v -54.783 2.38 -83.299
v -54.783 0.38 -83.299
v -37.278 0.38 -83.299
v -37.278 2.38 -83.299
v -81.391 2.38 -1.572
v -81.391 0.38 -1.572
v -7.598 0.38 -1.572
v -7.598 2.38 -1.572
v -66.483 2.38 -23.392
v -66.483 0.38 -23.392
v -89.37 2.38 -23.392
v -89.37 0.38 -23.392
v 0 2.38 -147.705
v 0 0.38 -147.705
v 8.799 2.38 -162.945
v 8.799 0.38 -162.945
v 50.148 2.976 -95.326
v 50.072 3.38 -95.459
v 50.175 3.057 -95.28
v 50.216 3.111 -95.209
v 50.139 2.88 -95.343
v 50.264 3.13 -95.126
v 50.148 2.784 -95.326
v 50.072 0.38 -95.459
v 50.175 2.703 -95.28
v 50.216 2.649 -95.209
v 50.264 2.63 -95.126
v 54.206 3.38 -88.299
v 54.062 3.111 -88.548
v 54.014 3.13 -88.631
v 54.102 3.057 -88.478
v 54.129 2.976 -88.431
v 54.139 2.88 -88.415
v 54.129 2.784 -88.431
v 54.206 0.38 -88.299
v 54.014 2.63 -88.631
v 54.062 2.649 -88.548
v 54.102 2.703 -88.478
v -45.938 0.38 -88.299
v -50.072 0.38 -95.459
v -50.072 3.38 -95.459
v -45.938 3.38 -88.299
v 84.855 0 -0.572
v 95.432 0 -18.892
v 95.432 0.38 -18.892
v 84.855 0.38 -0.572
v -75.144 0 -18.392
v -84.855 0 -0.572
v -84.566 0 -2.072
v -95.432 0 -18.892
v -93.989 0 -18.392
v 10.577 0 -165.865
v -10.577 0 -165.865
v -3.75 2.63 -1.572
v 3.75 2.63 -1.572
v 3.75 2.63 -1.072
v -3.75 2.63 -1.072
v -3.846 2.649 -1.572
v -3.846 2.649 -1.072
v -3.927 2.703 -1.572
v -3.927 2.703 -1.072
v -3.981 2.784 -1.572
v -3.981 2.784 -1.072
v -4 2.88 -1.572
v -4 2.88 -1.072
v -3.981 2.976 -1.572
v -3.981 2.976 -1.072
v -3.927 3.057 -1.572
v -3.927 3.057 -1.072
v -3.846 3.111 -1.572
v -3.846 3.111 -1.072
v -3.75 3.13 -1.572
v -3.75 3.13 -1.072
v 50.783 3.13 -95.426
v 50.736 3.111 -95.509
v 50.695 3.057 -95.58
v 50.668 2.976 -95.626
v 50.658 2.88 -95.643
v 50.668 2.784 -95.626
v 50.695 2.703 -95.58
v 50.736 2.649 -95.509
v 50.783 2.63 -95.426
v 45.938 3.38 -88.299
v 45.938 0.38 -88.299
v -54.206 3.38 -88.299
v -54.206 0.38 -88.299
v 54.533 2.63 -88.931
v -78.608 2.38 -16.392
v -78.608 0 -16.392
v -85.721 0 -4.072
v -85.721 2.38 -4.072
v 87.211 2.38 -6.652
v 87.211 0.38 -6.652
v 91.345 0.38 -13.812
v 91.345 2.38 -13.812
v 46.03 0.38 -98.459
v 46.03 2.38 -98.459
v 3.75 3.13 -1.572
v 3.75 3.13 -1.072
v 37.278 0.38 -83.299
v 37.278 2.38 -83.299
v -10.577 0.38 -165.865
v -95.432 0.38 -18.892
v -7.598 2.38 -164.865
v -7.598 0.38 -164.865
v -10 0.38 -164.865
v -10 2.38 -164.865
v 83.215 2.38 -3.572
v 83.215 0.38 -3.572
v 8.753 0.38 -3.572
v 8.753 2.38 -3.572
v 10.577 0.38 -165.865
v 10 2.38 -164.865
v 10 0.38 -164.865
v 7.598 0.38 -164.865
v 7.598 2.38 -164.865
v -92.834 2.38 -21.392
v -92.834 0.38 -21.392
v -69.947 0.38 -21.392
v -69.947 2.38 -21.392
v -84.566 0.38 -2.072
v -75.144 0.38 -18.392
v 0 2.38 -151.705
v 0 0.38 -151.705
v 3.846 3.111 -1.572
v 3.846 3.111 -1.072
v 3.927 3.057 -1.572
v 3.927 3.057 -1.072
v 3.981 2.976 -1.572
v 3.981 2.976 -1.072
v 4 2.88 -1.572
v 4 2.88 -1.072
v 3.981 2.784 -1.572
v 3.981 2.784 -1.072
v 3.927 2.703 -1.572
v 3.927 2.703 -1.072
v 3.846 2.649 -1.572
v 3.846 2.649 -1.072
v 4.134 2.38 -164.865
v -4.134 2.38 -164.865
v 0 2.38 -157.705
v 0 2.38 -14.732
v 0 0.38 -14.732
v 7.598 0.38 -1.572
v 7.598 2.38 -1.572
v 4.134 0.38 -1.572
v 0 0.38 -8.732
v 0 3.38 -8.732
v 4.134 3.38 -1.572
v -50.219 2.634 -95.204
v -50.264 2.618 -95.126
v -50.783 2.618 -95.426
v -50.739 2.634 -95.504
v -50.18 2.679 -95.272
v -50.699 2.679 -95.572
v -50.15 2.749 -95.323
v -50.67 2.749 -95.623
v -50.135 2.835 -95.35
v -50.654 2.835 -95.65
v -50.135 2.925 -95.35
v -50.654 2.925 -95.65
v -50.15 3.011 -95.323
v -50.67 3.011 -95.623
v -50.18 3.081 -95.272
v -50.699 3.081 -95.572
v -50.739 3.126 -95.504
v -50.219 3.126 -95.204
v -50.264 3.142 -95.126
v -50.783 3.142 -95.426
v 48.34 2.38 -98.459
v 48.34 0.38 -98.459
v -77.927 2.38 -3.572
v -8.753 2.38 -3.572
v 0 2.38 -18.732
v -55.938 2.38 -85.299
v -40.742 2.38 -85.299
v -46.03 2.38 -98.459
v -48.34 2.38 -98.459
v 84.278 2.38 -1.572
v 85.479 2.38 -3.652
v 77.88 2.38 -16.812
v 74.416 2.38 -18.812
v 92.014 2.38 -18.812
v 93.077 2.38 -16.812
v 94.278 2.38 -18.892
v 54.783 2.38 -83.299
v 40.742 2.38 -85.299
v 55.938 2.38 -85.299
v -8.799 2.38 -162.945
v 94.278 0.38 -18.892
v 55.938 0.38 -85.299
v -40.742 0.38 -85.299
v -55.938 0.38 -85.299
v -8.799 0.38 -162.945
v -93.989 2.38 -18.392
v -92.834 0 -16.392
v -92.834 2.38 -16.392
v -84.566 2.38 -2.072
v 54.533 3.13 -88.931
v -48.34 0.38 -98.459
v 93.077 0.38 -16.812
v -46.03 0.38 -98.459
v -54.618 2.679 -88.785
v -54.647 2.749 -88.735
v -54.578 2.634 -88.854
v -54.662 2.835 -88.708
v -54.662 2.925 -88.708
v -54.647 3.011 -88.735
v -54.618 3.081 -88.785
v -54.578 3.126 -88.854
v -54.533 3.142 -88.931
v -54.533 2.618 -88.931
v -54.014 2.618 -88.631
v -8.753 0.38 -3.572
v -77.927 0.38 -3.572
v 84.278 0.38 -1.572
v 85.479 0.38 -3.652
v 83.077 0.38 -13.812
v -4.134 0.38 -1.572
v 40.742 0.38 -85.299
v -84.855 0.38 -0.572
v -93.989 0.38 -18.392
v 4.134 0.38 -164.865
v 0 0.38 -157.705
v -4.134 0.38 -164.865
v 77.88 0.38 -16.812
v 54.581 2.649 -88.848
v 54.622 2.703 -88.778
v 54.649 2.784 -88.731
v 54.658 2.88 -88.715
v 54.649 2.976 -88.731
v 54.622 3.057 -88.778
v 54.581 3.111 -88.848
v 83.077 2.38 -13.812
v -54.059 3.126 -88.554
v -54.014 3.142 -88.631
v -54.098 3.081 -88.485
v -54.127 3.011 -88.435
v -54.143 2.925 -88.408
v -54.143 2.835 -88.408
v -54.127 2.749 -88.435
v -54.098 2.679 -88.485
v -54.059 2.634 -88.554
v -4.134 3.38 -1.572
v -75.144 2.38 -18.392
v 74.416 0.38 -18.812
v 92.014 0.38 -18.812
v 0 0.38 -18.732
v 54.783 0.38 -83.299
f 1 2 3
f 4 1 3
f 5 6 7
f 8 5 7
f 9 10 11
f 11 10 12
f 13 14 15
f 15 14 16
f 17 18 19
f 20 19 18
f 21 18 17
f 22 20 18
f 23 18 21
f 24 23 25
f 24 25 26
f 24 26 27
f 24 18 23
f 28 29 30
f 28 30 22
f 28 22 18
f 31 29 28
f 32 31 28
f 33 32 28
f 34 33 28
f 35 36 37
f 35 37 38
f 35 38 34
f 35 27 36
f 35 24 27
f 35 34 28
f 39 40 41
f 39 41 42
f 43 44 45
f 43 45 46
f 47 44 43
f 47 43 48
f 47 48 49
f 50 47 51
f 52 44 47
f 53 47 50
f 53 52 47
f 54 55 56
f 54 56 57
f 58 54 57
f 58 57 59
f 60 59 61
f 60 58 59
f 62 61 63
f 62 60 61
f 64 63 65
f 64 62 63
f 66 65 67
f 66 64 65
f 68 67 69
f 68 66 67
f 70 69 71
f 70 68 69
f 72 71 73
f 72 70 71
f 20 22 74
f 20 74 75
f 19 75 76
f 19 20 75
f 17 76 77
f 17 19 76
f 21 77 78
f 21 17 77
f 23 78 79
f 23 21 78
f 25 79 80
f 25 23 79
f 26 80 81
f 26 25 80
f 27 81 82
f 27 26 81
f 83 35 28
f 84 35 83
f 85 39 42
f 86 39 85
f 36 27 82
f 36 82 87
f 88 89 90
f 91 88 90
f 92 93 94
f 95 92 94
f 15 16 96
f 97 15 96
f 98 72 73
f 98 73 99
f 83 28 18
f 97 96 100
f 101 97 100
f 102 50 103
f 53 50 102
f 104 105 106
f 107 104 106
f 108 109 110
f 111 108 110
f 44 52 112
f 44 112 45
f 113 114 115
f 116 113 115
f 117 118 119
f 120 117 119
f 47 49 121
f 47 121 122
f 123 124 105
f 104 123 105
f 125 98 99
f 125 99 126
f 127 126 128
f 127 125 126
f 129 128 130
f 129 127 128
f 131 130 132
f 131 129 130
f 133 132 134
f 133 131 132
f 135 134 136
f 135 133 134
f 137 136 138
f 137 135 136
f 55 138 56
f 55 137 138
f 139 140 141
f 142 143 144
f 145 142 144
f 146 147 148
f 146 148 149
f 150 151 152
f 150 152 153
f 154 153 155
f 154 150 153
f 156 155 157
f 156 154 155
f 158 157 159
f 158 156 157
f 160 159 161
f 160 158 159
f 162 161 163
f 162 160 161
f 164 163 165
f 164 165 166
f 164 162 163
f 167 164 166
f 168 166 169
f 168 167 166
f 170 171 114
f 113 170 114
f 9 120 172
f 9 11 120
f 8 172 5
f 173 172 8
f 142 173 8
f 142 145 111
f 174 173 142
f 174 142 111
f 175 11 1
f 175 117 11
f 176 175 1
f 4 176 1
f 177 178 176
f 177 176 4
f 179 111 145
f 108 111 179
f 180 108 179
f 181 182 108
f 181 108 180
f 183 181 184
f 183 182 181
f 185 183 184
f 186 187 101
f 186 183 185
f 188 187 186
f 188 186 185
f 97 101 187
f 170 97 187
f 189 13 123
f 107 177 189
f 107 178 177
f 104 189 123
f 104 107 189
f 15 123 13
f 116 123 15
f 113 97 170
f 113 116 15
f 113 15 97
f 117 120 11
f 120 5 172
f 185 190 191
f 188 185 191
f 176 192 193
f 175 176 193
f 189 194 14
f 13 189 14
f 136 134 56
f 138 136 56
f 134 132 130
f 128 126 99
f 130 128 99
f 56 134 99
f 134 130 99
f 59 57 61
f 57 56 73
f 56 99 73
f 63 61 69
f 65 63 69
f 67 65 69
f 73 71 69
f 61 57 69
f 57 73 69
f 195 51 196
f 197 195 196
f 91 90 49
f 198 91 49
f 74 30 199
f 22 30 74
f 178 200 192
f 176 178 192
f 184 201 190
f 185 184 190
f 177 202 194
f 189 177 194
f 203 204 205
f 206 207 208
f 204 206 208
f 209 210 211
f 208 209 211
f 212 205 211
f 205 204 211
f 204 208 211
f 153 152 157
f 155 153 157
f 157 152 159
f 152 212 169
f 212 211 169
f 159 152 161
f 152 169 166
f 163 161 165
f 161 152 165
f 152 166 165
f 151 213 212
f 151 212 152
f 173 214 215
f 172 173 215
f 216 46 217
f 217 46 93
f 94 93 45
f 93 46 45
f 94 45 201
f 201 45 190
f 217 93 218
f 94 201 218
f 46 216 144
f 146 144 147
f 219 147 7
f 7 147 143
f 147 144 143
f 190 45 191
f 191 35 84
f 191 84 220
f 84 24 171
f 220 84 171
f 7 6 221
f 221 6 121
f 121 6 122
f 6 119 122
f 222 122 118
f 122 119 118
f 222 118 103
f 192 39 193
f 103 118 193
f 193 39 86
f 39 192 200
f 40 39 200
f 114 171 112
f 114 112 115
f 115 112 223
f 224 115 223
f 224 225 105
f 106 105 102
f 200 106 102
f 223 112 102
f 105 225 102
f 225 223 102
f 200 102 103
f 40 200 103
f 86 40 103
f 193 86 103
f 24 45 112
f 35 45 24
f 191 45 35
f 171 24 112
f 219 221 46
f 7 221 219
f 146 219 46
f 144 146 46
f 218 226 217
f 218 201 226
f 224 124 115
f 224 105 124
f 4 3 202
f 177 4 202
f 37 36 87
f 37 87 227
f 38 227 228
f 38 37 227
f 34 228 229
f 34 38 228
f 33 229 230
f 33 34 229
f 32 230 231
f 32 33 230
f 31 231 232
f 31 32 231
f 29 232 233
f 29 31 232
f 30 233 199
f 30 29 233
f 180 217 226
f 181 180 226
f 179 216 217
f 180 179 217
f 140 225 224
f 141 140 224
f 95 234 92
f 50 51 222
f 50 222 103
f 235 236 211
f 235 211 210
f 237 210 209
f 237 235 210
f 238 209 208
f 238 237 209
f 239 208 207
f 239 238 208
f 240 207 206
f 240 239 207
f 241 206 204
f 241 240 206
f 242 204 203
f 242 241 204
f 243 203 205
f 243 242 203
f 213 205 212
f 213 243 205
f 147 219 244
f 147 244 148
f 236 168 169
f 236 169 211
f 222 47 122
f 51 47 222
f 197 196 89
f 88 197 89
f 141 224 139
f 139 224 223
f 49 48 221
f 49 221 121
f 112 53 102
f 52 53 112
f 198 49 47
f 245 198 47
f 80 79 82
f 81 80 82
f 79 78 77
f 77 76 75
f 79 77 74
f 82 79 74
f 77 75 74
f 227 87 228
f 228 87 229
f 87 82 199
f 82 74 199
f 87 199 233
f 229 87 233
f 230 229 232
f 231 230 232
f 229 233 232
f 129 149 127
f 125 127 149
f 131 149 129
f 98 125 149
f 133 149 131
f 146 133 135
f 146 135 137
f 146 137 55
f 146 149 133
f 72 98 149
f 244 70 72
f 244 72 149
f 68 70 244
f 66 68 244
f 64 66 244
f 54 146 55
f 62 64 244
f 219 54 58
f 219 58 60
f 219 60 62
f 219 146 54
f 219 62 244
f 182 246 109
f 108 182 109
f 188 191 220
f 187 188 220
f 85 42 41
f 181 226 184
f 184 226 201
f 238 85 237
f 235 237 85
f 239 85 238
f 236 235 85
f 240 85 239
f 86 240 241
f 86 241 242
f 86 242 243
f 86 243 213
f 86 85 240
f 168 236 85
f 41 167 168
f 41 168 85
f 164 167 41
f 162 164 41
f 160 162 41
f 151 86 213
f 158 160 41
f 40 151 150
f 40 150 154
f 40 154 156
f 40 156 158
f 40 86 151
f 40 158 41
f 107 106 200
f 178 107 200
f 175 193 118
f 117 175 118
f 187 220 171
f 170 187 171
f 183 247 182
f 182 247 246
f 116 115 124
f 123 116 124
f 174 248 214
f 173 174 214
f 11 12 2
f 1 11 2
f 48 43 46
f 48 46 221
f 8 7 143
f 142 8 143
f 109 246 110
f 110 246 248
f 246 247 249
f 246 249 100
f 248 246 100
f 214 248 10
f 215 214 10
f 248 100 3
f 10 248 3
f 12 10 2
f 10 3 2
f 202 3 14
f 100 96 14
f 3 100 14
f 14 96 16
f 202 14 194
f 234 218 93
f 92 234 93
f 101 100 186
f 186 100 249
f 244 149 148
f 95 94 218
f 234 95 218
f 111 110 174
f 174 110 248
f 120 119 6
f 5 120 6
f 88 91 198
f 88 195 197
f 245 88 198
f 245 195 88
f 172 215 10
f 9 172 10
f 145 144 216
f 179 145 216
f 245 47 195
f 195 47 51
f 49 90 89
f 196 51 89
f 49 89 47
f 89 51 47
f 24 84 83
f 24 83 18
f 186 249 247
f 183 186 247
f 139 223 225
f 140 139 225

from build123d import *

# Parameters (mm, degrees)
BOSS_EXTRUDE1_DEPTH   = 2.38
BOSS_EXTRUDE1_2_DEPTH = 2.38
BOSS_EXTRUDE1_3_DEPTH = 2.38
BOSS_EXTRUDE1_4_DEPTH = 2.38
BOSS_EXTRUDE4_DEPTH   = 0.38
BOSS_EXTRUDE5_DEPTH   = 3.38
BOSS_EXTRUDE6_DEPTH   = 0.5
BOSS_EXTRUDE7_DEPTH   = 0.6
BOSS_EXTRUDE8_DEPTH   = 0.6


with BuildPart() as part:
    # Sketch1 → Boss-Extrude1 (new body)
    with BuildSketch(Plane(origin=(0, 0, 0), x_dir=(1, 0, 0), z_dir=(0, 1, 0))):
        Polygon((-85.720943795, 4.071796796), (-84.566243256, 2.071796795), (-75.143593538, 18.392304849), (-93.988892974, 18.392304849), (-92.834192436, 16.392304849), (-78.607695153, 16.392304849), align=None)
    extrude(amount=BOSS_EXTRUDE1_DEPTH)


with BuildPart() as body_2:
    # Sketch1 → Boss-Extrude1 2 (new body)
    with BuildSketch(Plane(origin=(0, 0, 0), x_dir=(1, 0, 0), z_dir=(0, 1, 0))):
        Polygon((91.344555444, 13.812177834), (83.076606252, 13.812177834), (87.210580853, 6.651923788), align=None)
    extrude(amount=BOSS_EXTRUDE1_2_DEPTH)


with BuildPart() as body_3:
    # Sketch1 → Boss-Extrude1 3 (new body)
    with BuildSketch(Plane(origin=(0, 0, 0), x_dir=(1, 0, 0), z_dir=(0, 1, 0))):
        Polygon((4.133974596, 164.865334799), (-4.133974596, 164.865334799), (0, 157.705080761), align=None)
    extrude(amount=BOSS_EXTRUDE1_3_DEPTH)


with BuildPart() as body_4:
    # Sketch1 → Boss-Extrude1 4 (new body)
    with BuildSketch(Plane(origin=(0, 0, 0), x_dir=(1, 0, 0), z_dir=(0, 1, 0))):
        Polygon((-92.834192436, 21.392304849), (-69.947441134, 21.392304849), (-81.390816785, 1.571796811), (-7.598076227, 1.571796811), (5.6e-08, 14.732050972), (7.598076338, 1.571796812), (84.27756817, 1.571796812), (85.478530104, 3.651923899), (77.880453952, 16.812177834), (93.076606256, 16.812177834), (94.277568143, 18.892304841), (55.937822181, 85.298692796), (40.741669759, 85.298692796), (48.33974597, 98.458946834), (10.000000007, 164.865334792), (7.598076211, 164.865334792), (0, 151.705080754), (-7.598076212, 164.865334792), (-9.999999977, 164.865334792), (-48.339745938, 98.458946839), (-40.741669726, 85.298692801), (-55.937822149, 85.298692801), align=None)
        Polygon((-8.752776823, 3.571796679), (-77.926715228, 3.571796679), (-66.4833395, 23.392304849), (-89.370090821, 23.392304849), (-54.783121611, 83.298692801), (-37.277568111, 83.298692801), (-46.030344861, 98.458946839), (-8.799038094, 162.945461791), (0, 147.705080754), (8.799038109, 162.945461817), (46.030344894, 98.458946834), (37.277568144, 83.298692796), (54.783121643, 83.298692796), (92.014428415, 18.812177834), (74.416352337, 18.812177834), (83.2153905, 3.571796679), (8.752776819, 3.571796679), (-2e-09, 18.73205084), align=None, mode=Mode.SUBTRACT)
    extrude(amount=BOSS_EXTRUDE1_4_DEPTH)


    add(body_2.part)  # Boss-Extrude4 merges body 2

    add(body_3.part)  # Boss-Extrude4 merges body 3
    # Sketch1<8> → Boss-Extrude4 (add)
    # profile 1 of 2: a face of its own
    with BuildSketch(Plane(origin=(0, 0, 0), x_dir=(1, 0, 0), z_dir=(0, 1, 0))):
        Polygon((-75.143593538, 18.392304849), (-84.566243256, 2.071796795), (-84.854918391, 0.571796796), (84.85491843, 0.571796796), (95.432268703, 18.892304753), (10.577350242, 165.865334799), (-10.577350242, 165.865334799), (-95.432268647, 18.892304849), (-93.988892974, 18.392304849), align=None)
        Polygon((4.133974507, 1.571796687), (-4.133974466, 1.571796687), (-1.08e-07, 8.732050756), align=None, mode=Mode.SUBTRACT)
        Polygon((87.210580853, 6.651923788), (83.076606252, 13.812177834), (91.344555444, 13.812177834), align=None, mode=Mode.SUBTRACT)
        Polygon((-45.937822149, 88.298692801), (-54.205771341, 88.298692801), (-50.071796745, 95.458946839), align=None, mode=Mode.SUBTRACT)
        Polygon((0, 157.705080761), (-4.133974596, 164.865334799), (4.133974596, 164.865334799), align=None, mode=Mode.SUBTRACT)
        Polygon((-81.390816785, 1.571796811), (-69.947441134, 21.392304849), (-92.834192436, 21.392304849), (-55.937822149, 85.298692801), (-40.741669726, 85.298692801), (-48.339745938, 98.458946839), (-9.999999977, 164.865334792), (-7.598076212, 164.865334792), (0, 151.705080754), (7.598076211, 164.865334792), (10.000000007, 164.865334792), (48.33974597, 98.458946834), (40.741669759, 85.298692796), (55.937822181, 85.298692796), (94.277568143, 18.892304841), (93.076606256, 16.812177834), (77.880453952, 16.812177834), (85.478530104, 3.651923899), (84.27756817, 1.571796812), (7.598076338, 1.571796812), (5.6e-08, 14.732050972), (-7.598076227, 1.571796811), align=None, mode=Mode.SUBTRACT)
        Polygon((54.205771446, 88.298692803), (45.937822254, 88.298692803), (50.07179685, 95.458946841), align=None, mode=Mode.SUBTRACT)
    # profile 2 of 2: a face of its own
    with BuildSketch(Plane(origin=(0, 0, 0), x_dir=(1, 0, 0), z_dir=(0, 1, 0))):
        Polygon((-66.4833395, 23.392304849), (-77.926715228, 3.571796679), (-8.752776823, 3.571796679), (-2e-09, 18.73205084), (8.752776819, 3.571796679), (83.2153905, 3.571796679), (74.416352337, 18.812177834), (92.014428415, 18.812177834), (54.783121643, 83.298692796), (37.277568144, 83.298692796), (46.030344894, 98.458946834), (8.799038109, 162.945461817), (0, 147.705080754), (-8.799038094, 162.945461791), (-46.030344861, 98.458946839), (-37.277568111, 83.298692801), (-54.783121611, 83.298692801), (-89.370090821, 23.392304849), align=None)
    extrude(amount=BOSS_EXTRUDE4_DEPTH)

    # Sketch1<9> → Boss-Extrude5 (add)
    with BuildSketch(Plane(origin=(0, 0, 0), x_dir=(1, 0, 0), z_dir=(0, 1, 0))):
        Polygon((-1.08e-07, 8.732050756), (-4.133974466, 1.571796687), (4.133974507, 1.571796687), align=None)
        Polygon((50.07179685, 95.458946841), (45.937822254, 88.298692803), (54.205771446, 88.298692803), align=None)
        Polygon((-50.071796745, 95.458946839), (-54.205771341, 88.298692801), (-45.937822149, 88.298692801), align=None)
    extrude(amount=BOSS_EXTRUDE5_DEPTH)

    # Sketch2 → Boss-Extrude6 (add)
    with BuildSketch(Plane.XY.offset(-1.571796687)):
        with BuildLine():
            Line((3.750000065, 2.63), (-3.749999935, 2.63))
            ThreePointArc((-3.749999935, 2.63), (-3.999999935, 2.88), (-3.749999935, 3.13))
            Line((-3.749999935, 3.13), (3.750000065, 3.13))
            ThreePointArc((3.750000065, 3.13), (4.000000065, 2.88), (3.750000065, 2.63))
        make_face()
    extrude(amount=BOSS_EXTRUDE6_DEPTH)

    # Sketch4 → Boss-Extrude7 (add)
    with BuildSketch(Plane(origin=(-78.888784049, 0, -45.546460707), x_dir=(-0.500000000000003, 0, 0.8660254037844369), z_dir=(-0.8660254037844369, 0, -0.500000000000003))):
        with BuildLine():
            Line((-57.25000001, 3.141925265), (-49.75000001, 3.141925265))
            ThreePointArc((-49.75000001, 3.141925265), (-49.488074744, 2.88), (-49.75000001, 2.618074735))
            Line((-49.75000001, 2.618074735), (-57.25000001, 2.618074735))
            ThreePointArc((-57.25000001, 2.618074735), (-57.511925275, 2.88), (-57.25000001, 3.141925265))
        make_face()
    extrude(amount=BOSS_EXTRUDE7_DEPTH)

    # Sketch5 → Boss-Extrude8 (add)
    with BuildSketch(Plane(origin=(78.888784129, 0, -45.546460753), x_dir=(-0.5000000000000008, 0, -0.8660254037844383), z_dir=(0.8660254037844382, 0, -0.5000000000000007))):
        with BuildLine():
            Line((49.749999961, 3.13), (57.249999961, 3.13))
            ThreePointArc((57.249999961, 3.13), (57.499999961, 2.88), (57.249999961, 2.63))
            Line((57.249999961, 2.63), (49.749999961, 2.63))
            ThreePointArc((49.749999961, 2.63), (49.499999961, 2.88), (49.749999961, 3.13))
        make_face()
    extrude(amount=BOSS_EXTRUDE8_DEPTH)


solid = Compound([part.part, body_4.part])
